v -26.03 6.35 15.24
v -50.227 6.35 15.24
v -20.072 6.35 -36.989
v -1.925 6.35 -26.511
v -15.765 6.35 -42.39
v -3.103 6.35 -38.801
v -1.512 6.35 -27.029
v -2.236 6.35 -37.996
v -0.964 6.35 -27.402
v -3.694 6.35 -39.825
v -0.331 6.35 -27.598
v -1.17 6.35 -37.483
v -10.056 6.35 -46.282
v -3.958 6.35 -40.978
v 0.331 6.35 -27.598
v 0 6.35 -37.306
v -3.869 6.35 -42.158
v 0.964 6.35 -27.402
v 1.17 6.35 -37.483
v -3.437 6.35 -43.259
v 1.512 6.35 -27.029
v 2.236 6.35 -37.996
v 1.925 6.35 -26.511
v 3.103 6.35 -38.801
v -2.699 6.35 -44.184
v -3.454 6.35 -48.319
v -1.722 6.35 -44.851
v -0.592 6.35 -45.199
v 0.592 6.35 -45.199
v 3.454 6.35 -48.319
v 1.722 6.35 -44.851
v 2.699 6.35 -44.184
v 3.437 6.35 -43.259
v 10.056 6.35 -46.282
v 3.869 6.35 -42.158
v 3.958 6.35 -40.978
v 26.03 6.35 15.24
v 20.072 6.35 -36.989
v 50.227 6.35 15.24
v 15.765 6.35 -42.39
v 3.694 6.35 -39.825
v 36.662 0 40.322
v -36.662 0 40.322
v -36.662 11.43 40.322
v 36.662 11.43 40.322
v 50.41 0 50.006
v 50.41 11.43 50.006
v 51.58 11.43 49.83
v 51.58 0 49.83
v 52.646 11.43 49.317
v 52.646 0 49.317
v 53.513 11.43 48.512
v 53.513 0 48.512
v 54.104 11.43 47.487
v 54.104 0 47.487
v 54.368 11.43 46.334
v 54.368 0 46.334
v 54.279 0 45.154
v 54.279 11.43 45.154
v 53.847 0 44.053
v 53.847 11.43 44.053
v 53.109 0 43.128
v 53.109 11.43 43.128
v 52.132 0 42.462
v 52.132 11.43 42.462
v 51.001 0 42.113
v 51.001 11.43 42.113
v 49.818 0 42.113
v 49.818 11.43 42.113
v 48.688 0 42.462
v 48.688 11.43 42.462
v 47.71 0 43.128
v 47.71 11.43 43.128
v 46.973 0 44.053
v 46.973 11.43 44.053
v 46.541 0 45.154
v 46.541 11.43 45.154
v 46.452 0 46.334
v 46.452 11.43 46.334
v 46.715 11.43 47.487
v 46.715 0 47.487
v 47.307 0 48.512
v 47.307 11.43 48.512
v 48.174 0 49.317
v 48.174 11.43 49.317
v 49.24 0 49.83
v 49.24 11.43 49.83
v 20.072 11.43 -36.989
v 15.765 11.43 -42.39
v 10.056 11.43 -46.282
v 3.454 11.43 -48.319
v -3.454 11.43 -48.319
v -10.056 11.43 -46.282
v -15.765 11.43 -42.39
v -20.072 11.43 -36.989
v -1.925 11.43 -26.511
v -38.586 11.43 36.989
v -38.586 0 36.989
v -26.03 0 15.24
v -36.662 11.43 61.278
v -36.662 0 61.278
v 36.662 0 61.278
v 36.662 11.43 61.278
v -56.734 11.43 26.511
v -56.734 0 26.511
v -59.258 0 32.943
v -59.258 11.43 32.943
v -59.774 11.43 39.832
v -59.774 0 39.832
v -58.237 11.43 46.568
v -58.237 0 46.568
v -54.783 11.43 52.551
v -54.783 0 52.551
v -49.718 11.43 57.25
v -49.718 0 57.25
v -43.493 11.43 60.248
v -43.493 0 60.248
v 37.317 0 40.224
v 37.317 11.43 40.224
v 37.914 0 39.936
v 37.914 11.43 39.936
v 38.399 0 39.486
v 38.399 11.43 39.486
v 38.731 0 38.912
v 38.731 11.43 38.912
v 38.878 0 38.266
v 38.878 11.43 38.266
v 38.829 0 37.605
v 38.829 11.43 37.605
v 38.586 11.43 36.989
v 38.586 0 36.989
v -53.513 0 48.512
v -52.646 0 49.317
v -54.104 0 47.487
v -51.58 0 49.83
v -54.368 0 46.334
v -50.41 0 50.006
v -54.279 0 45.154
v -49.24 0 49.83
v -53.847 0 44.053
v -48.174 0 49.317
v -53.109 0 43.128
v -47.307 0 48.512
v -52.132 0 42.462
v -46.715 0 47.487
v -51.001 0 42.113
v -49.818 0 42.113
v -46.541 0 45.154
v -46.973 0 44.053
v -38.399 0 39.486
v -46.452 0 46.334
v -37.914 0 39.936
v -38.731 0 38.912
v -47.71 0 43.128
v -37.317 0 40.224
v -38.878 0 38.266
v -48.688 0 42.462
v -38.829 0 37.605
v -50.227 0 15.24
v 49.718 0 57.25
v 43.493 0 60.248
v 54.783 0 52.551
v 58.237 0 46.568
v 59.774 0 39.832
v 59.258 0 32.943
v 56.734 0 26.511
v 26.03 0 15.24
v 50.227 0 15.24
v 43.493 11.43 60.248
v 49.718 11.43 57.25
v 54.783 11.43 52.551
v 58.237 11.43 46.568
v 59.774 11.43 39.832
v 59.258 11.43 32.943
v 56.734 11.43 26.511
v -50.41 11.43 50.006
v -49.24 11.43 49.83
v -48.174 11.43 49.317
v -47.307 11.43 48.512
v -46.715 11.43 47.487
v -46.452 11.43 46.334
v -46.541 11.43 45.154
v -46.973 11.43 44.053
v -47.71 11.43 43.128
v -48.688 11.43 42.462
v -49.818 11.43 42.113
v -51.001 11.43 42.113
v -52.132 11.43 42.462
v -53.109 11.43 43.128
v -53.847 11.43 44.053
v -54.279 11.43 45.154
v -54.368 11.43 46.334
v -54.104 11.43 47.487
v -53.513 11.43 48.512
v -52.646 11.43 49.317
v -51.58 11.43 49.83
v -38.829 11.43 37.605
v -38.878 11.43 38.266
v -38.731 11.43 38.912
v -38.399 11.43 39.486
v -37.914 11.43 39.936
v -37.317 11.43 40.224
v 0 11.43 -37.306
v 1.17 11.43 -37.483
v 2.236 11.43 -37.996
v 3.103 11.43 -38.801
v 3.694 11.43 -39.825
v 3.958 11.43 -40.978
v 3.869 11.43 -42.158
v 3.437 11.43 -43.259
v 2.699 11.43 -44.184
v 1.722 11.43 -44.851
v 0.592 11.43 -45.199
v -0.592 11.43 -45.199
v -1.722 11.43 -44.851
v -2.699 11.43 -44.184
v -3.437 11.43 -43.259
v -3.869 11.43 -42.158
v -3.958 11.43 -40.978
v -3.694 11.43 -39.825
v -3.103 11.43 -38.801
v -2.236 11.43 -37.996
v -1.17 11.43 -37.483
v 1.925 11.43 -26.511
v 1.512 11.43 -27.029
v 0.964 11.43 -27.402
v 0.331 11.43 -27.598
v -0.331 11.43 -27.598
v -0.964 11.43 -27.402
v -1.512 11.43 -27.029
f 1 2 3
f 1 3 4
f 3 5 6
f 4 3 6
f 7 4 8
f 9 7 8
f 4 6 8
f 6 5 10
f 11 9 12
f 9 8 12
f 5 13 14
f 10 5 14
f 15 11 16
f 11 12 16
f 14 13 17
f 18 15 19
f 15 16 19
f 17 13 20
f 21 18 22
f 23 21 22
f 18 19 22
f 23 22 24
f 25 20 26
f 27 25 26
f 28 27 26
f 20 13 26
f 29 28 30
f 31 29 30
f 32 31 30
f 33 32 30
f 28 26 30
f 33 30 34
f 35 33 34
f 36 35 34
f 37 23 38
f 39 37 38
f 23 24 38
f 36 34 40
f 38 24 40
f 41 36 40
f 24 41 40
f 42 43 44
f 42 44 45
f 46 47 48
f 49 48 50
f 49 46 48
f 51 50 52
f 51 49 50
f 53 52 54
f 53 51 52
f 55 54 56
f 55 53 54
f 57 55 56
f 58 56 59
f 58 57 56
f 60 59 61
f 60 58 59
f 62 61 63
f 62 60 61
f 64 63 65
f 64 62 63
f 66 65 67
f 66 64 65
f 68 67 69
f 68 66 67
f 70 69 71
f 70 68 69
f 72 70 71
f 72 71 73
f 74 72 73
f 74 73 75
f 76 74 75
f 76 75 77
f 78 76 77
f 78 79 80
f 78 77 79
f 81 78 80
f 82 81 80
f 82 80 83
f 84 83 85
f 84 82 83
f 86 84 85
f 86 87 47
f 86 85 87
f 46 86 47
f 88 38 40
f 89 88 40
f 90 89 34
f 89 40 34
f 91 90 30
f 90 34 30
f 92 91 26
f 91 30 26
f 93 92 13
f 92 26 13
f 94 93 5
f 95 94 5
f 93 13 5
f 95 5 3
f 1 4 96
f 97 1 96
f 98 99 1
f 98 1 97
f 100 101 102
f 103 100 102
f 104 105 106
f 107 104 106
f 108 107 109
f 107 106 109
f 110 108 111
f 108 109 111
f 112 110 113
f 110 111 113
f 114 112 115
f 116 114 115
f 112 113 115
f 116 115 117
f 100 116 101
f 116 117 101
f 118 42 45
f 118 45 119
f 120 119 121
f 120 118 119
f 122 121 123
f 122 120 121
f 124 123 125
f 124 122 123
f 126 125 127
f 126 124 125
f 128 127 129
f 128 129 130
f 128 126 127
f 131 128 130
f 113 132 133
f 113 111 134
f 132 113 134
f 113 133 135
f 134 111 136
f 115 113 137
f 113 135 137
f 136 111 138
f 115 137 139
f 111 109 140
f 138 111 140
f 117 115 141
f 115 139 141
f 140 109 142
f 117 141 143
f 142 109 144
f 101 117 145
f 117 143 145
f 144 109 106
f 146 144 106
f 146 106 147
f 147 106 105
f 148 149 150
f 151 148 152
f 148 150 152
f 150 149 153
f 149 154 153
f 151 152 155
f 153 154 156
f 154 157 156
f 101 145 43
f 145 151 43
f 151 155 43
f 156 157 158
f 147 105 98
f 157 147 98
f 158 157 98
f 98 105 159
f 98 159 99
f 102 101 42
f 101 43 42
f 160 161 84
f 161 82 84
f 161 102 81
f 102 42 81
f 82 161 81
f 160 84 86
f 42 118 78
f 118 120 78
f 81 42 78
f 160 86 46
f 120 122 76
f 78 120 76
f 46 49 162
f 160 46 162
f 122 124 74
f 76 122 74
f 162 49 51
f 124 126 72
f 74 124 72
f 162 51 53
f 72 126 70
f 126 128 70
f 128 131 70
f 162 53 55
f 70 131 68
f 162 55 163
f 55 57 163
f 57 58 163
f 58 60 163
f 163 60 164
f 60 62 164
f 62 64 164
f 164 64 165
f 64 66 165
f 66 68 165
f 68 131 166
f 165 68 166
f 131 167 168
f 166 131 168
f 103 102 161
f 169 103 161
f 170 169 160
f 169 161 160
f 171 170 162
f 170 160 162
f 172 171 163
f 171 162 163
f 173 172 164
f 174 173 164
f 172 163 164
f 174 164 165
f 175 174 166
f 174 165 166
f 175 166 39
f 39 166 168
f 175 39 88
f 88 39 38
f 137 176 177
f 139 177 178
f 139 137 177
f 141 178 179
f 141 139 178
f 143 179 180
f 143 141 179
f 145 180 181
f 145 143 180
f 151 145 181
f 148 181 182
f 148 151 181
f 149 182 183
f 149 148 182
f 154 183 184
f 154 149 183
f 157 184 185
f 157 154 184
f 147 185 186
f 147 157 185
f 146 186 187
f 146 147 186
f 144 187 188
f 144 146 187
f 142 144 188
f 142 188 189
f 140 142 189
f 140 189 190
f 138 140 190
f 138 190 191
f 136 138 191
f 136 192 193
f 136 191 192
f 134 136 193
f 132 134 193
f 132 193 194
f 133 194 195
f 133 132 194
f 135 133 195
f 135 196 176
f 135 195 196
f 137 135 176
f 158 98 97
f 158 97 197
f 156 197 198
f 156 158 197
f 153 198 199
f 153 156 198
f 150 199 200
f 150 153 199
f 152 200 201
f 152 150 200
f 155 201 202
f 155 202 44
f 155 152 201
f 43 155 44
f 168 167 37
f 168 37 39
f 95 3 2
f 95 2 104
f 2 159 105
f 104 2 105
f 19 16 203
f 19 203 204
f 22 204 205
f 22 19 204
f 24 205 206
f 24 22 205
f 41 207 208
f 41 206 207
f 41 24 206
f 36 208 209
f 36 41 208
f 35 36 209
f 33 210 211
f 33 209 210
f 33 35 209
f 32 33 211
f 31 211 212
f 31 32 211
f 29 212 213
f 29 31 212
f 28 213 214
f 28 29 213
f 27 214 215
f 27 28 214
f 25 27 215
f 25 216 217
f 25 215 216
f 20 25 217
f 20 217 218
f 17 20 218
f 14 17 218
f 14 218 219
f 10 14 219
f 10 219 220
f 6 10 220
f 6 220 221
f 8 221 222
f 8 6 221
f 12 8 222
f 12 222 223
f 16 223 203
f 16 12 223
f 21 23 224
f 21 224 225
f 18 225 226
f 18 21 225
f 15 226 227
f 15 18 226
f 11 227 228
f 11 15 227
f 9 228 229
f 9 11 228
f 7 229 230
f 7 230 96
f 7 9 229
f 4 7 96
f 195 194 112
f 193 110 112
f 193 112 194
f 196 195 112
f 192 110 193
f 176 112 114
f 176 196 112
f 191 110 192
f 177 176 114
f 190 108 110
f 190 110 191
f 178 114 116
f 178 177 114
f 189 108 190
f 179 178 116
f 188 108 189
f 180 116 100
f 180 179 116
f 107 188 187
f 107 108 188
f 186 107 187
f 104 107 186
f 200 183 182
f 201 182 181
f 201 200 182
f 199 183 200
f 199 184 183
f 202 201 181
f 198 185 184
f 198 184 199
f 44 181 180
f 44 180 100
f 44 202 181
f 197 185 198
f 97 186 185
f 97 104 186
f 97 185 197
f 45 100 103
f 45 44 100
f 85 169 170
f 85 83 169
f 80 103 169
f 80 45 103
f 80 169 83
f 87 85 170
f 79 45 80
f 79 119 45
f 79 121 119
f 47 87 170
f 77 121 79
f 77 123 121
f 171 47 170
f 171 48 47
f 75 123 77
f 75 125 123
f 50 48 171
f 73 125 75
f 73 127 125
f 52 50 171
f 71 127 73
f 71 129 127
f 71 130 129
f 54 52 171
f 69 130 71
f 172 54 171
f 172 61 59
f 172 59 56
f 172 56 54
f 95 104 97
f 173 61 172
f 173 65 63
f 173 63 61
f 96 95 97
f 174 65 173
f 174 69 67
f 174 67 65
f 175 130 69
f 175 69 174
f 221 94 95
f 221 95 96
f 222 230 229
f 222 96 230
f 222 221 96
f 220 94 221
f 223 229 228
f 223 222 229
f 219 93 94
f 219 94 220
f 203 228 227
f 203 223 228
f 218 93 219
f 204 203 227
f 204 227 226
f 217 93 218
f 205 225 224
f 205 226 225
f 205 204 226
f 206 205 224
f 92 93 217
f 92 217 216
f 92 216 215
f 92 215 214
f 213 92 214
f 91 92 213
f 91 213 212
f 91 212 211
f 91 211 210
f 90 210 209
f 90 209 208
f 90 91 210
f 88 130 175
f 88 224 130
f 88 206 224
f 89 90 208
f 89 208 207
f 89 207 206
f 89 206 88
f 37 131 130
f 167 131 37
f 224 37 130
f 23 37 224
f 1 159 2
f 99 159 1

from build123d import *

# Parameters (mm, degrees)
EXTRUDE_THIN1_DEPTH = 11.43
SKETCH2_R           = 3.96875
CUT_EXTRUDE1_DEPTH  = 87.407822566
SKETCH3_W           = 127
SKETCH3_H           = 76.2
CUT_EXTRUDE2_DEPTH  = 6.35


with BuildPart() as part:
    # Sketch1 → Extrude-Thin1 (new body)
    with BuildSketch(Plane(origin=(0, 0, 0), x_dir=(1, 0, 0), z_dir=(0, 1, 0))):
        with BuildLine():
            Line((-36.661742094, -61.2775), (36.661742094, -61.2775))
            ThreePointArc((36.661742094, -61.2775), (56.73404589, -49.68875), (56.73404589, -26.51125))
            Line((56.73404589, -26.51125), (20.072303796, 36.98875))
            ThreePointArc((20.072303796, 36.98875), (0, 48.5775), (-20.072303796, 36.98875))
            Line((-20.072303796, 36.98875), (-56.73404589, -26.51125))
            ThreePointArc((-56.73404589, -26.51125), (-56.73404589, -49.68875), (-36.661742094, -61.2775))
        make_face()
        with BuildLine():
            Line((-36.661742094, -40.3225), (36.661742094, -40.3225))
            ThreePointArc((36.661742094, -40.3225), (38.586483553, -39.21125), (38.586483553, -36.98875))
            Line((38.586483553, -36.98875), (1.92474146, 26.51125))
            ThreePointArc((1.92474146, 26.51125), (0, 27.6225), (-1.92474146, 26.51125))
            Line((-1.92474146, 26.51125), (-38.586483553, -36.98875))
            ThreePointArc((-38.586483553, -36.98875), (-38.586483553, -39.21125), (-36.661742094, -40.3225))
        make_face(mode=Mode.SUBTRACT)
    extrude(amount=EXTRUDE_THIN1_DEPTH)

    # Sketch2 → Cut-Extrude1 (cut, through all)
    with BuildSketch(Plane(origin=(0, 0, 0), x_dir=(1, 0, 0), z_dir=(0, 1, 0))):
        with Locations((-50.409895379, -46.0375)):
            Circle(SKETCH2_R)
        with Locations((0, 41.275)):
            Circle(SKETCH2_R)
        with Locations((50.409895379, -46.0375)):
            Circle(SKETCH2_R)
    extrude(amount=CUT_EXTRUDE1_DEPTH, mode=Mode.SUBTRACT)

    # Sketch3 → Cut-Extrude2 (cut)
    with BuildSketch(Plane(origin=(0, 0, 0), x_dir=(1, 0, 0), z_dir=(0, 1, 0))):
        with Locations((0, 22.86)):
            Rectangle(SKETCH3_W, SKETCH3_H)
    extrude(amount=CUT_EXTRUDE2_DEPTH, mode=Mode.SUBTRACT)


solid = part.part
